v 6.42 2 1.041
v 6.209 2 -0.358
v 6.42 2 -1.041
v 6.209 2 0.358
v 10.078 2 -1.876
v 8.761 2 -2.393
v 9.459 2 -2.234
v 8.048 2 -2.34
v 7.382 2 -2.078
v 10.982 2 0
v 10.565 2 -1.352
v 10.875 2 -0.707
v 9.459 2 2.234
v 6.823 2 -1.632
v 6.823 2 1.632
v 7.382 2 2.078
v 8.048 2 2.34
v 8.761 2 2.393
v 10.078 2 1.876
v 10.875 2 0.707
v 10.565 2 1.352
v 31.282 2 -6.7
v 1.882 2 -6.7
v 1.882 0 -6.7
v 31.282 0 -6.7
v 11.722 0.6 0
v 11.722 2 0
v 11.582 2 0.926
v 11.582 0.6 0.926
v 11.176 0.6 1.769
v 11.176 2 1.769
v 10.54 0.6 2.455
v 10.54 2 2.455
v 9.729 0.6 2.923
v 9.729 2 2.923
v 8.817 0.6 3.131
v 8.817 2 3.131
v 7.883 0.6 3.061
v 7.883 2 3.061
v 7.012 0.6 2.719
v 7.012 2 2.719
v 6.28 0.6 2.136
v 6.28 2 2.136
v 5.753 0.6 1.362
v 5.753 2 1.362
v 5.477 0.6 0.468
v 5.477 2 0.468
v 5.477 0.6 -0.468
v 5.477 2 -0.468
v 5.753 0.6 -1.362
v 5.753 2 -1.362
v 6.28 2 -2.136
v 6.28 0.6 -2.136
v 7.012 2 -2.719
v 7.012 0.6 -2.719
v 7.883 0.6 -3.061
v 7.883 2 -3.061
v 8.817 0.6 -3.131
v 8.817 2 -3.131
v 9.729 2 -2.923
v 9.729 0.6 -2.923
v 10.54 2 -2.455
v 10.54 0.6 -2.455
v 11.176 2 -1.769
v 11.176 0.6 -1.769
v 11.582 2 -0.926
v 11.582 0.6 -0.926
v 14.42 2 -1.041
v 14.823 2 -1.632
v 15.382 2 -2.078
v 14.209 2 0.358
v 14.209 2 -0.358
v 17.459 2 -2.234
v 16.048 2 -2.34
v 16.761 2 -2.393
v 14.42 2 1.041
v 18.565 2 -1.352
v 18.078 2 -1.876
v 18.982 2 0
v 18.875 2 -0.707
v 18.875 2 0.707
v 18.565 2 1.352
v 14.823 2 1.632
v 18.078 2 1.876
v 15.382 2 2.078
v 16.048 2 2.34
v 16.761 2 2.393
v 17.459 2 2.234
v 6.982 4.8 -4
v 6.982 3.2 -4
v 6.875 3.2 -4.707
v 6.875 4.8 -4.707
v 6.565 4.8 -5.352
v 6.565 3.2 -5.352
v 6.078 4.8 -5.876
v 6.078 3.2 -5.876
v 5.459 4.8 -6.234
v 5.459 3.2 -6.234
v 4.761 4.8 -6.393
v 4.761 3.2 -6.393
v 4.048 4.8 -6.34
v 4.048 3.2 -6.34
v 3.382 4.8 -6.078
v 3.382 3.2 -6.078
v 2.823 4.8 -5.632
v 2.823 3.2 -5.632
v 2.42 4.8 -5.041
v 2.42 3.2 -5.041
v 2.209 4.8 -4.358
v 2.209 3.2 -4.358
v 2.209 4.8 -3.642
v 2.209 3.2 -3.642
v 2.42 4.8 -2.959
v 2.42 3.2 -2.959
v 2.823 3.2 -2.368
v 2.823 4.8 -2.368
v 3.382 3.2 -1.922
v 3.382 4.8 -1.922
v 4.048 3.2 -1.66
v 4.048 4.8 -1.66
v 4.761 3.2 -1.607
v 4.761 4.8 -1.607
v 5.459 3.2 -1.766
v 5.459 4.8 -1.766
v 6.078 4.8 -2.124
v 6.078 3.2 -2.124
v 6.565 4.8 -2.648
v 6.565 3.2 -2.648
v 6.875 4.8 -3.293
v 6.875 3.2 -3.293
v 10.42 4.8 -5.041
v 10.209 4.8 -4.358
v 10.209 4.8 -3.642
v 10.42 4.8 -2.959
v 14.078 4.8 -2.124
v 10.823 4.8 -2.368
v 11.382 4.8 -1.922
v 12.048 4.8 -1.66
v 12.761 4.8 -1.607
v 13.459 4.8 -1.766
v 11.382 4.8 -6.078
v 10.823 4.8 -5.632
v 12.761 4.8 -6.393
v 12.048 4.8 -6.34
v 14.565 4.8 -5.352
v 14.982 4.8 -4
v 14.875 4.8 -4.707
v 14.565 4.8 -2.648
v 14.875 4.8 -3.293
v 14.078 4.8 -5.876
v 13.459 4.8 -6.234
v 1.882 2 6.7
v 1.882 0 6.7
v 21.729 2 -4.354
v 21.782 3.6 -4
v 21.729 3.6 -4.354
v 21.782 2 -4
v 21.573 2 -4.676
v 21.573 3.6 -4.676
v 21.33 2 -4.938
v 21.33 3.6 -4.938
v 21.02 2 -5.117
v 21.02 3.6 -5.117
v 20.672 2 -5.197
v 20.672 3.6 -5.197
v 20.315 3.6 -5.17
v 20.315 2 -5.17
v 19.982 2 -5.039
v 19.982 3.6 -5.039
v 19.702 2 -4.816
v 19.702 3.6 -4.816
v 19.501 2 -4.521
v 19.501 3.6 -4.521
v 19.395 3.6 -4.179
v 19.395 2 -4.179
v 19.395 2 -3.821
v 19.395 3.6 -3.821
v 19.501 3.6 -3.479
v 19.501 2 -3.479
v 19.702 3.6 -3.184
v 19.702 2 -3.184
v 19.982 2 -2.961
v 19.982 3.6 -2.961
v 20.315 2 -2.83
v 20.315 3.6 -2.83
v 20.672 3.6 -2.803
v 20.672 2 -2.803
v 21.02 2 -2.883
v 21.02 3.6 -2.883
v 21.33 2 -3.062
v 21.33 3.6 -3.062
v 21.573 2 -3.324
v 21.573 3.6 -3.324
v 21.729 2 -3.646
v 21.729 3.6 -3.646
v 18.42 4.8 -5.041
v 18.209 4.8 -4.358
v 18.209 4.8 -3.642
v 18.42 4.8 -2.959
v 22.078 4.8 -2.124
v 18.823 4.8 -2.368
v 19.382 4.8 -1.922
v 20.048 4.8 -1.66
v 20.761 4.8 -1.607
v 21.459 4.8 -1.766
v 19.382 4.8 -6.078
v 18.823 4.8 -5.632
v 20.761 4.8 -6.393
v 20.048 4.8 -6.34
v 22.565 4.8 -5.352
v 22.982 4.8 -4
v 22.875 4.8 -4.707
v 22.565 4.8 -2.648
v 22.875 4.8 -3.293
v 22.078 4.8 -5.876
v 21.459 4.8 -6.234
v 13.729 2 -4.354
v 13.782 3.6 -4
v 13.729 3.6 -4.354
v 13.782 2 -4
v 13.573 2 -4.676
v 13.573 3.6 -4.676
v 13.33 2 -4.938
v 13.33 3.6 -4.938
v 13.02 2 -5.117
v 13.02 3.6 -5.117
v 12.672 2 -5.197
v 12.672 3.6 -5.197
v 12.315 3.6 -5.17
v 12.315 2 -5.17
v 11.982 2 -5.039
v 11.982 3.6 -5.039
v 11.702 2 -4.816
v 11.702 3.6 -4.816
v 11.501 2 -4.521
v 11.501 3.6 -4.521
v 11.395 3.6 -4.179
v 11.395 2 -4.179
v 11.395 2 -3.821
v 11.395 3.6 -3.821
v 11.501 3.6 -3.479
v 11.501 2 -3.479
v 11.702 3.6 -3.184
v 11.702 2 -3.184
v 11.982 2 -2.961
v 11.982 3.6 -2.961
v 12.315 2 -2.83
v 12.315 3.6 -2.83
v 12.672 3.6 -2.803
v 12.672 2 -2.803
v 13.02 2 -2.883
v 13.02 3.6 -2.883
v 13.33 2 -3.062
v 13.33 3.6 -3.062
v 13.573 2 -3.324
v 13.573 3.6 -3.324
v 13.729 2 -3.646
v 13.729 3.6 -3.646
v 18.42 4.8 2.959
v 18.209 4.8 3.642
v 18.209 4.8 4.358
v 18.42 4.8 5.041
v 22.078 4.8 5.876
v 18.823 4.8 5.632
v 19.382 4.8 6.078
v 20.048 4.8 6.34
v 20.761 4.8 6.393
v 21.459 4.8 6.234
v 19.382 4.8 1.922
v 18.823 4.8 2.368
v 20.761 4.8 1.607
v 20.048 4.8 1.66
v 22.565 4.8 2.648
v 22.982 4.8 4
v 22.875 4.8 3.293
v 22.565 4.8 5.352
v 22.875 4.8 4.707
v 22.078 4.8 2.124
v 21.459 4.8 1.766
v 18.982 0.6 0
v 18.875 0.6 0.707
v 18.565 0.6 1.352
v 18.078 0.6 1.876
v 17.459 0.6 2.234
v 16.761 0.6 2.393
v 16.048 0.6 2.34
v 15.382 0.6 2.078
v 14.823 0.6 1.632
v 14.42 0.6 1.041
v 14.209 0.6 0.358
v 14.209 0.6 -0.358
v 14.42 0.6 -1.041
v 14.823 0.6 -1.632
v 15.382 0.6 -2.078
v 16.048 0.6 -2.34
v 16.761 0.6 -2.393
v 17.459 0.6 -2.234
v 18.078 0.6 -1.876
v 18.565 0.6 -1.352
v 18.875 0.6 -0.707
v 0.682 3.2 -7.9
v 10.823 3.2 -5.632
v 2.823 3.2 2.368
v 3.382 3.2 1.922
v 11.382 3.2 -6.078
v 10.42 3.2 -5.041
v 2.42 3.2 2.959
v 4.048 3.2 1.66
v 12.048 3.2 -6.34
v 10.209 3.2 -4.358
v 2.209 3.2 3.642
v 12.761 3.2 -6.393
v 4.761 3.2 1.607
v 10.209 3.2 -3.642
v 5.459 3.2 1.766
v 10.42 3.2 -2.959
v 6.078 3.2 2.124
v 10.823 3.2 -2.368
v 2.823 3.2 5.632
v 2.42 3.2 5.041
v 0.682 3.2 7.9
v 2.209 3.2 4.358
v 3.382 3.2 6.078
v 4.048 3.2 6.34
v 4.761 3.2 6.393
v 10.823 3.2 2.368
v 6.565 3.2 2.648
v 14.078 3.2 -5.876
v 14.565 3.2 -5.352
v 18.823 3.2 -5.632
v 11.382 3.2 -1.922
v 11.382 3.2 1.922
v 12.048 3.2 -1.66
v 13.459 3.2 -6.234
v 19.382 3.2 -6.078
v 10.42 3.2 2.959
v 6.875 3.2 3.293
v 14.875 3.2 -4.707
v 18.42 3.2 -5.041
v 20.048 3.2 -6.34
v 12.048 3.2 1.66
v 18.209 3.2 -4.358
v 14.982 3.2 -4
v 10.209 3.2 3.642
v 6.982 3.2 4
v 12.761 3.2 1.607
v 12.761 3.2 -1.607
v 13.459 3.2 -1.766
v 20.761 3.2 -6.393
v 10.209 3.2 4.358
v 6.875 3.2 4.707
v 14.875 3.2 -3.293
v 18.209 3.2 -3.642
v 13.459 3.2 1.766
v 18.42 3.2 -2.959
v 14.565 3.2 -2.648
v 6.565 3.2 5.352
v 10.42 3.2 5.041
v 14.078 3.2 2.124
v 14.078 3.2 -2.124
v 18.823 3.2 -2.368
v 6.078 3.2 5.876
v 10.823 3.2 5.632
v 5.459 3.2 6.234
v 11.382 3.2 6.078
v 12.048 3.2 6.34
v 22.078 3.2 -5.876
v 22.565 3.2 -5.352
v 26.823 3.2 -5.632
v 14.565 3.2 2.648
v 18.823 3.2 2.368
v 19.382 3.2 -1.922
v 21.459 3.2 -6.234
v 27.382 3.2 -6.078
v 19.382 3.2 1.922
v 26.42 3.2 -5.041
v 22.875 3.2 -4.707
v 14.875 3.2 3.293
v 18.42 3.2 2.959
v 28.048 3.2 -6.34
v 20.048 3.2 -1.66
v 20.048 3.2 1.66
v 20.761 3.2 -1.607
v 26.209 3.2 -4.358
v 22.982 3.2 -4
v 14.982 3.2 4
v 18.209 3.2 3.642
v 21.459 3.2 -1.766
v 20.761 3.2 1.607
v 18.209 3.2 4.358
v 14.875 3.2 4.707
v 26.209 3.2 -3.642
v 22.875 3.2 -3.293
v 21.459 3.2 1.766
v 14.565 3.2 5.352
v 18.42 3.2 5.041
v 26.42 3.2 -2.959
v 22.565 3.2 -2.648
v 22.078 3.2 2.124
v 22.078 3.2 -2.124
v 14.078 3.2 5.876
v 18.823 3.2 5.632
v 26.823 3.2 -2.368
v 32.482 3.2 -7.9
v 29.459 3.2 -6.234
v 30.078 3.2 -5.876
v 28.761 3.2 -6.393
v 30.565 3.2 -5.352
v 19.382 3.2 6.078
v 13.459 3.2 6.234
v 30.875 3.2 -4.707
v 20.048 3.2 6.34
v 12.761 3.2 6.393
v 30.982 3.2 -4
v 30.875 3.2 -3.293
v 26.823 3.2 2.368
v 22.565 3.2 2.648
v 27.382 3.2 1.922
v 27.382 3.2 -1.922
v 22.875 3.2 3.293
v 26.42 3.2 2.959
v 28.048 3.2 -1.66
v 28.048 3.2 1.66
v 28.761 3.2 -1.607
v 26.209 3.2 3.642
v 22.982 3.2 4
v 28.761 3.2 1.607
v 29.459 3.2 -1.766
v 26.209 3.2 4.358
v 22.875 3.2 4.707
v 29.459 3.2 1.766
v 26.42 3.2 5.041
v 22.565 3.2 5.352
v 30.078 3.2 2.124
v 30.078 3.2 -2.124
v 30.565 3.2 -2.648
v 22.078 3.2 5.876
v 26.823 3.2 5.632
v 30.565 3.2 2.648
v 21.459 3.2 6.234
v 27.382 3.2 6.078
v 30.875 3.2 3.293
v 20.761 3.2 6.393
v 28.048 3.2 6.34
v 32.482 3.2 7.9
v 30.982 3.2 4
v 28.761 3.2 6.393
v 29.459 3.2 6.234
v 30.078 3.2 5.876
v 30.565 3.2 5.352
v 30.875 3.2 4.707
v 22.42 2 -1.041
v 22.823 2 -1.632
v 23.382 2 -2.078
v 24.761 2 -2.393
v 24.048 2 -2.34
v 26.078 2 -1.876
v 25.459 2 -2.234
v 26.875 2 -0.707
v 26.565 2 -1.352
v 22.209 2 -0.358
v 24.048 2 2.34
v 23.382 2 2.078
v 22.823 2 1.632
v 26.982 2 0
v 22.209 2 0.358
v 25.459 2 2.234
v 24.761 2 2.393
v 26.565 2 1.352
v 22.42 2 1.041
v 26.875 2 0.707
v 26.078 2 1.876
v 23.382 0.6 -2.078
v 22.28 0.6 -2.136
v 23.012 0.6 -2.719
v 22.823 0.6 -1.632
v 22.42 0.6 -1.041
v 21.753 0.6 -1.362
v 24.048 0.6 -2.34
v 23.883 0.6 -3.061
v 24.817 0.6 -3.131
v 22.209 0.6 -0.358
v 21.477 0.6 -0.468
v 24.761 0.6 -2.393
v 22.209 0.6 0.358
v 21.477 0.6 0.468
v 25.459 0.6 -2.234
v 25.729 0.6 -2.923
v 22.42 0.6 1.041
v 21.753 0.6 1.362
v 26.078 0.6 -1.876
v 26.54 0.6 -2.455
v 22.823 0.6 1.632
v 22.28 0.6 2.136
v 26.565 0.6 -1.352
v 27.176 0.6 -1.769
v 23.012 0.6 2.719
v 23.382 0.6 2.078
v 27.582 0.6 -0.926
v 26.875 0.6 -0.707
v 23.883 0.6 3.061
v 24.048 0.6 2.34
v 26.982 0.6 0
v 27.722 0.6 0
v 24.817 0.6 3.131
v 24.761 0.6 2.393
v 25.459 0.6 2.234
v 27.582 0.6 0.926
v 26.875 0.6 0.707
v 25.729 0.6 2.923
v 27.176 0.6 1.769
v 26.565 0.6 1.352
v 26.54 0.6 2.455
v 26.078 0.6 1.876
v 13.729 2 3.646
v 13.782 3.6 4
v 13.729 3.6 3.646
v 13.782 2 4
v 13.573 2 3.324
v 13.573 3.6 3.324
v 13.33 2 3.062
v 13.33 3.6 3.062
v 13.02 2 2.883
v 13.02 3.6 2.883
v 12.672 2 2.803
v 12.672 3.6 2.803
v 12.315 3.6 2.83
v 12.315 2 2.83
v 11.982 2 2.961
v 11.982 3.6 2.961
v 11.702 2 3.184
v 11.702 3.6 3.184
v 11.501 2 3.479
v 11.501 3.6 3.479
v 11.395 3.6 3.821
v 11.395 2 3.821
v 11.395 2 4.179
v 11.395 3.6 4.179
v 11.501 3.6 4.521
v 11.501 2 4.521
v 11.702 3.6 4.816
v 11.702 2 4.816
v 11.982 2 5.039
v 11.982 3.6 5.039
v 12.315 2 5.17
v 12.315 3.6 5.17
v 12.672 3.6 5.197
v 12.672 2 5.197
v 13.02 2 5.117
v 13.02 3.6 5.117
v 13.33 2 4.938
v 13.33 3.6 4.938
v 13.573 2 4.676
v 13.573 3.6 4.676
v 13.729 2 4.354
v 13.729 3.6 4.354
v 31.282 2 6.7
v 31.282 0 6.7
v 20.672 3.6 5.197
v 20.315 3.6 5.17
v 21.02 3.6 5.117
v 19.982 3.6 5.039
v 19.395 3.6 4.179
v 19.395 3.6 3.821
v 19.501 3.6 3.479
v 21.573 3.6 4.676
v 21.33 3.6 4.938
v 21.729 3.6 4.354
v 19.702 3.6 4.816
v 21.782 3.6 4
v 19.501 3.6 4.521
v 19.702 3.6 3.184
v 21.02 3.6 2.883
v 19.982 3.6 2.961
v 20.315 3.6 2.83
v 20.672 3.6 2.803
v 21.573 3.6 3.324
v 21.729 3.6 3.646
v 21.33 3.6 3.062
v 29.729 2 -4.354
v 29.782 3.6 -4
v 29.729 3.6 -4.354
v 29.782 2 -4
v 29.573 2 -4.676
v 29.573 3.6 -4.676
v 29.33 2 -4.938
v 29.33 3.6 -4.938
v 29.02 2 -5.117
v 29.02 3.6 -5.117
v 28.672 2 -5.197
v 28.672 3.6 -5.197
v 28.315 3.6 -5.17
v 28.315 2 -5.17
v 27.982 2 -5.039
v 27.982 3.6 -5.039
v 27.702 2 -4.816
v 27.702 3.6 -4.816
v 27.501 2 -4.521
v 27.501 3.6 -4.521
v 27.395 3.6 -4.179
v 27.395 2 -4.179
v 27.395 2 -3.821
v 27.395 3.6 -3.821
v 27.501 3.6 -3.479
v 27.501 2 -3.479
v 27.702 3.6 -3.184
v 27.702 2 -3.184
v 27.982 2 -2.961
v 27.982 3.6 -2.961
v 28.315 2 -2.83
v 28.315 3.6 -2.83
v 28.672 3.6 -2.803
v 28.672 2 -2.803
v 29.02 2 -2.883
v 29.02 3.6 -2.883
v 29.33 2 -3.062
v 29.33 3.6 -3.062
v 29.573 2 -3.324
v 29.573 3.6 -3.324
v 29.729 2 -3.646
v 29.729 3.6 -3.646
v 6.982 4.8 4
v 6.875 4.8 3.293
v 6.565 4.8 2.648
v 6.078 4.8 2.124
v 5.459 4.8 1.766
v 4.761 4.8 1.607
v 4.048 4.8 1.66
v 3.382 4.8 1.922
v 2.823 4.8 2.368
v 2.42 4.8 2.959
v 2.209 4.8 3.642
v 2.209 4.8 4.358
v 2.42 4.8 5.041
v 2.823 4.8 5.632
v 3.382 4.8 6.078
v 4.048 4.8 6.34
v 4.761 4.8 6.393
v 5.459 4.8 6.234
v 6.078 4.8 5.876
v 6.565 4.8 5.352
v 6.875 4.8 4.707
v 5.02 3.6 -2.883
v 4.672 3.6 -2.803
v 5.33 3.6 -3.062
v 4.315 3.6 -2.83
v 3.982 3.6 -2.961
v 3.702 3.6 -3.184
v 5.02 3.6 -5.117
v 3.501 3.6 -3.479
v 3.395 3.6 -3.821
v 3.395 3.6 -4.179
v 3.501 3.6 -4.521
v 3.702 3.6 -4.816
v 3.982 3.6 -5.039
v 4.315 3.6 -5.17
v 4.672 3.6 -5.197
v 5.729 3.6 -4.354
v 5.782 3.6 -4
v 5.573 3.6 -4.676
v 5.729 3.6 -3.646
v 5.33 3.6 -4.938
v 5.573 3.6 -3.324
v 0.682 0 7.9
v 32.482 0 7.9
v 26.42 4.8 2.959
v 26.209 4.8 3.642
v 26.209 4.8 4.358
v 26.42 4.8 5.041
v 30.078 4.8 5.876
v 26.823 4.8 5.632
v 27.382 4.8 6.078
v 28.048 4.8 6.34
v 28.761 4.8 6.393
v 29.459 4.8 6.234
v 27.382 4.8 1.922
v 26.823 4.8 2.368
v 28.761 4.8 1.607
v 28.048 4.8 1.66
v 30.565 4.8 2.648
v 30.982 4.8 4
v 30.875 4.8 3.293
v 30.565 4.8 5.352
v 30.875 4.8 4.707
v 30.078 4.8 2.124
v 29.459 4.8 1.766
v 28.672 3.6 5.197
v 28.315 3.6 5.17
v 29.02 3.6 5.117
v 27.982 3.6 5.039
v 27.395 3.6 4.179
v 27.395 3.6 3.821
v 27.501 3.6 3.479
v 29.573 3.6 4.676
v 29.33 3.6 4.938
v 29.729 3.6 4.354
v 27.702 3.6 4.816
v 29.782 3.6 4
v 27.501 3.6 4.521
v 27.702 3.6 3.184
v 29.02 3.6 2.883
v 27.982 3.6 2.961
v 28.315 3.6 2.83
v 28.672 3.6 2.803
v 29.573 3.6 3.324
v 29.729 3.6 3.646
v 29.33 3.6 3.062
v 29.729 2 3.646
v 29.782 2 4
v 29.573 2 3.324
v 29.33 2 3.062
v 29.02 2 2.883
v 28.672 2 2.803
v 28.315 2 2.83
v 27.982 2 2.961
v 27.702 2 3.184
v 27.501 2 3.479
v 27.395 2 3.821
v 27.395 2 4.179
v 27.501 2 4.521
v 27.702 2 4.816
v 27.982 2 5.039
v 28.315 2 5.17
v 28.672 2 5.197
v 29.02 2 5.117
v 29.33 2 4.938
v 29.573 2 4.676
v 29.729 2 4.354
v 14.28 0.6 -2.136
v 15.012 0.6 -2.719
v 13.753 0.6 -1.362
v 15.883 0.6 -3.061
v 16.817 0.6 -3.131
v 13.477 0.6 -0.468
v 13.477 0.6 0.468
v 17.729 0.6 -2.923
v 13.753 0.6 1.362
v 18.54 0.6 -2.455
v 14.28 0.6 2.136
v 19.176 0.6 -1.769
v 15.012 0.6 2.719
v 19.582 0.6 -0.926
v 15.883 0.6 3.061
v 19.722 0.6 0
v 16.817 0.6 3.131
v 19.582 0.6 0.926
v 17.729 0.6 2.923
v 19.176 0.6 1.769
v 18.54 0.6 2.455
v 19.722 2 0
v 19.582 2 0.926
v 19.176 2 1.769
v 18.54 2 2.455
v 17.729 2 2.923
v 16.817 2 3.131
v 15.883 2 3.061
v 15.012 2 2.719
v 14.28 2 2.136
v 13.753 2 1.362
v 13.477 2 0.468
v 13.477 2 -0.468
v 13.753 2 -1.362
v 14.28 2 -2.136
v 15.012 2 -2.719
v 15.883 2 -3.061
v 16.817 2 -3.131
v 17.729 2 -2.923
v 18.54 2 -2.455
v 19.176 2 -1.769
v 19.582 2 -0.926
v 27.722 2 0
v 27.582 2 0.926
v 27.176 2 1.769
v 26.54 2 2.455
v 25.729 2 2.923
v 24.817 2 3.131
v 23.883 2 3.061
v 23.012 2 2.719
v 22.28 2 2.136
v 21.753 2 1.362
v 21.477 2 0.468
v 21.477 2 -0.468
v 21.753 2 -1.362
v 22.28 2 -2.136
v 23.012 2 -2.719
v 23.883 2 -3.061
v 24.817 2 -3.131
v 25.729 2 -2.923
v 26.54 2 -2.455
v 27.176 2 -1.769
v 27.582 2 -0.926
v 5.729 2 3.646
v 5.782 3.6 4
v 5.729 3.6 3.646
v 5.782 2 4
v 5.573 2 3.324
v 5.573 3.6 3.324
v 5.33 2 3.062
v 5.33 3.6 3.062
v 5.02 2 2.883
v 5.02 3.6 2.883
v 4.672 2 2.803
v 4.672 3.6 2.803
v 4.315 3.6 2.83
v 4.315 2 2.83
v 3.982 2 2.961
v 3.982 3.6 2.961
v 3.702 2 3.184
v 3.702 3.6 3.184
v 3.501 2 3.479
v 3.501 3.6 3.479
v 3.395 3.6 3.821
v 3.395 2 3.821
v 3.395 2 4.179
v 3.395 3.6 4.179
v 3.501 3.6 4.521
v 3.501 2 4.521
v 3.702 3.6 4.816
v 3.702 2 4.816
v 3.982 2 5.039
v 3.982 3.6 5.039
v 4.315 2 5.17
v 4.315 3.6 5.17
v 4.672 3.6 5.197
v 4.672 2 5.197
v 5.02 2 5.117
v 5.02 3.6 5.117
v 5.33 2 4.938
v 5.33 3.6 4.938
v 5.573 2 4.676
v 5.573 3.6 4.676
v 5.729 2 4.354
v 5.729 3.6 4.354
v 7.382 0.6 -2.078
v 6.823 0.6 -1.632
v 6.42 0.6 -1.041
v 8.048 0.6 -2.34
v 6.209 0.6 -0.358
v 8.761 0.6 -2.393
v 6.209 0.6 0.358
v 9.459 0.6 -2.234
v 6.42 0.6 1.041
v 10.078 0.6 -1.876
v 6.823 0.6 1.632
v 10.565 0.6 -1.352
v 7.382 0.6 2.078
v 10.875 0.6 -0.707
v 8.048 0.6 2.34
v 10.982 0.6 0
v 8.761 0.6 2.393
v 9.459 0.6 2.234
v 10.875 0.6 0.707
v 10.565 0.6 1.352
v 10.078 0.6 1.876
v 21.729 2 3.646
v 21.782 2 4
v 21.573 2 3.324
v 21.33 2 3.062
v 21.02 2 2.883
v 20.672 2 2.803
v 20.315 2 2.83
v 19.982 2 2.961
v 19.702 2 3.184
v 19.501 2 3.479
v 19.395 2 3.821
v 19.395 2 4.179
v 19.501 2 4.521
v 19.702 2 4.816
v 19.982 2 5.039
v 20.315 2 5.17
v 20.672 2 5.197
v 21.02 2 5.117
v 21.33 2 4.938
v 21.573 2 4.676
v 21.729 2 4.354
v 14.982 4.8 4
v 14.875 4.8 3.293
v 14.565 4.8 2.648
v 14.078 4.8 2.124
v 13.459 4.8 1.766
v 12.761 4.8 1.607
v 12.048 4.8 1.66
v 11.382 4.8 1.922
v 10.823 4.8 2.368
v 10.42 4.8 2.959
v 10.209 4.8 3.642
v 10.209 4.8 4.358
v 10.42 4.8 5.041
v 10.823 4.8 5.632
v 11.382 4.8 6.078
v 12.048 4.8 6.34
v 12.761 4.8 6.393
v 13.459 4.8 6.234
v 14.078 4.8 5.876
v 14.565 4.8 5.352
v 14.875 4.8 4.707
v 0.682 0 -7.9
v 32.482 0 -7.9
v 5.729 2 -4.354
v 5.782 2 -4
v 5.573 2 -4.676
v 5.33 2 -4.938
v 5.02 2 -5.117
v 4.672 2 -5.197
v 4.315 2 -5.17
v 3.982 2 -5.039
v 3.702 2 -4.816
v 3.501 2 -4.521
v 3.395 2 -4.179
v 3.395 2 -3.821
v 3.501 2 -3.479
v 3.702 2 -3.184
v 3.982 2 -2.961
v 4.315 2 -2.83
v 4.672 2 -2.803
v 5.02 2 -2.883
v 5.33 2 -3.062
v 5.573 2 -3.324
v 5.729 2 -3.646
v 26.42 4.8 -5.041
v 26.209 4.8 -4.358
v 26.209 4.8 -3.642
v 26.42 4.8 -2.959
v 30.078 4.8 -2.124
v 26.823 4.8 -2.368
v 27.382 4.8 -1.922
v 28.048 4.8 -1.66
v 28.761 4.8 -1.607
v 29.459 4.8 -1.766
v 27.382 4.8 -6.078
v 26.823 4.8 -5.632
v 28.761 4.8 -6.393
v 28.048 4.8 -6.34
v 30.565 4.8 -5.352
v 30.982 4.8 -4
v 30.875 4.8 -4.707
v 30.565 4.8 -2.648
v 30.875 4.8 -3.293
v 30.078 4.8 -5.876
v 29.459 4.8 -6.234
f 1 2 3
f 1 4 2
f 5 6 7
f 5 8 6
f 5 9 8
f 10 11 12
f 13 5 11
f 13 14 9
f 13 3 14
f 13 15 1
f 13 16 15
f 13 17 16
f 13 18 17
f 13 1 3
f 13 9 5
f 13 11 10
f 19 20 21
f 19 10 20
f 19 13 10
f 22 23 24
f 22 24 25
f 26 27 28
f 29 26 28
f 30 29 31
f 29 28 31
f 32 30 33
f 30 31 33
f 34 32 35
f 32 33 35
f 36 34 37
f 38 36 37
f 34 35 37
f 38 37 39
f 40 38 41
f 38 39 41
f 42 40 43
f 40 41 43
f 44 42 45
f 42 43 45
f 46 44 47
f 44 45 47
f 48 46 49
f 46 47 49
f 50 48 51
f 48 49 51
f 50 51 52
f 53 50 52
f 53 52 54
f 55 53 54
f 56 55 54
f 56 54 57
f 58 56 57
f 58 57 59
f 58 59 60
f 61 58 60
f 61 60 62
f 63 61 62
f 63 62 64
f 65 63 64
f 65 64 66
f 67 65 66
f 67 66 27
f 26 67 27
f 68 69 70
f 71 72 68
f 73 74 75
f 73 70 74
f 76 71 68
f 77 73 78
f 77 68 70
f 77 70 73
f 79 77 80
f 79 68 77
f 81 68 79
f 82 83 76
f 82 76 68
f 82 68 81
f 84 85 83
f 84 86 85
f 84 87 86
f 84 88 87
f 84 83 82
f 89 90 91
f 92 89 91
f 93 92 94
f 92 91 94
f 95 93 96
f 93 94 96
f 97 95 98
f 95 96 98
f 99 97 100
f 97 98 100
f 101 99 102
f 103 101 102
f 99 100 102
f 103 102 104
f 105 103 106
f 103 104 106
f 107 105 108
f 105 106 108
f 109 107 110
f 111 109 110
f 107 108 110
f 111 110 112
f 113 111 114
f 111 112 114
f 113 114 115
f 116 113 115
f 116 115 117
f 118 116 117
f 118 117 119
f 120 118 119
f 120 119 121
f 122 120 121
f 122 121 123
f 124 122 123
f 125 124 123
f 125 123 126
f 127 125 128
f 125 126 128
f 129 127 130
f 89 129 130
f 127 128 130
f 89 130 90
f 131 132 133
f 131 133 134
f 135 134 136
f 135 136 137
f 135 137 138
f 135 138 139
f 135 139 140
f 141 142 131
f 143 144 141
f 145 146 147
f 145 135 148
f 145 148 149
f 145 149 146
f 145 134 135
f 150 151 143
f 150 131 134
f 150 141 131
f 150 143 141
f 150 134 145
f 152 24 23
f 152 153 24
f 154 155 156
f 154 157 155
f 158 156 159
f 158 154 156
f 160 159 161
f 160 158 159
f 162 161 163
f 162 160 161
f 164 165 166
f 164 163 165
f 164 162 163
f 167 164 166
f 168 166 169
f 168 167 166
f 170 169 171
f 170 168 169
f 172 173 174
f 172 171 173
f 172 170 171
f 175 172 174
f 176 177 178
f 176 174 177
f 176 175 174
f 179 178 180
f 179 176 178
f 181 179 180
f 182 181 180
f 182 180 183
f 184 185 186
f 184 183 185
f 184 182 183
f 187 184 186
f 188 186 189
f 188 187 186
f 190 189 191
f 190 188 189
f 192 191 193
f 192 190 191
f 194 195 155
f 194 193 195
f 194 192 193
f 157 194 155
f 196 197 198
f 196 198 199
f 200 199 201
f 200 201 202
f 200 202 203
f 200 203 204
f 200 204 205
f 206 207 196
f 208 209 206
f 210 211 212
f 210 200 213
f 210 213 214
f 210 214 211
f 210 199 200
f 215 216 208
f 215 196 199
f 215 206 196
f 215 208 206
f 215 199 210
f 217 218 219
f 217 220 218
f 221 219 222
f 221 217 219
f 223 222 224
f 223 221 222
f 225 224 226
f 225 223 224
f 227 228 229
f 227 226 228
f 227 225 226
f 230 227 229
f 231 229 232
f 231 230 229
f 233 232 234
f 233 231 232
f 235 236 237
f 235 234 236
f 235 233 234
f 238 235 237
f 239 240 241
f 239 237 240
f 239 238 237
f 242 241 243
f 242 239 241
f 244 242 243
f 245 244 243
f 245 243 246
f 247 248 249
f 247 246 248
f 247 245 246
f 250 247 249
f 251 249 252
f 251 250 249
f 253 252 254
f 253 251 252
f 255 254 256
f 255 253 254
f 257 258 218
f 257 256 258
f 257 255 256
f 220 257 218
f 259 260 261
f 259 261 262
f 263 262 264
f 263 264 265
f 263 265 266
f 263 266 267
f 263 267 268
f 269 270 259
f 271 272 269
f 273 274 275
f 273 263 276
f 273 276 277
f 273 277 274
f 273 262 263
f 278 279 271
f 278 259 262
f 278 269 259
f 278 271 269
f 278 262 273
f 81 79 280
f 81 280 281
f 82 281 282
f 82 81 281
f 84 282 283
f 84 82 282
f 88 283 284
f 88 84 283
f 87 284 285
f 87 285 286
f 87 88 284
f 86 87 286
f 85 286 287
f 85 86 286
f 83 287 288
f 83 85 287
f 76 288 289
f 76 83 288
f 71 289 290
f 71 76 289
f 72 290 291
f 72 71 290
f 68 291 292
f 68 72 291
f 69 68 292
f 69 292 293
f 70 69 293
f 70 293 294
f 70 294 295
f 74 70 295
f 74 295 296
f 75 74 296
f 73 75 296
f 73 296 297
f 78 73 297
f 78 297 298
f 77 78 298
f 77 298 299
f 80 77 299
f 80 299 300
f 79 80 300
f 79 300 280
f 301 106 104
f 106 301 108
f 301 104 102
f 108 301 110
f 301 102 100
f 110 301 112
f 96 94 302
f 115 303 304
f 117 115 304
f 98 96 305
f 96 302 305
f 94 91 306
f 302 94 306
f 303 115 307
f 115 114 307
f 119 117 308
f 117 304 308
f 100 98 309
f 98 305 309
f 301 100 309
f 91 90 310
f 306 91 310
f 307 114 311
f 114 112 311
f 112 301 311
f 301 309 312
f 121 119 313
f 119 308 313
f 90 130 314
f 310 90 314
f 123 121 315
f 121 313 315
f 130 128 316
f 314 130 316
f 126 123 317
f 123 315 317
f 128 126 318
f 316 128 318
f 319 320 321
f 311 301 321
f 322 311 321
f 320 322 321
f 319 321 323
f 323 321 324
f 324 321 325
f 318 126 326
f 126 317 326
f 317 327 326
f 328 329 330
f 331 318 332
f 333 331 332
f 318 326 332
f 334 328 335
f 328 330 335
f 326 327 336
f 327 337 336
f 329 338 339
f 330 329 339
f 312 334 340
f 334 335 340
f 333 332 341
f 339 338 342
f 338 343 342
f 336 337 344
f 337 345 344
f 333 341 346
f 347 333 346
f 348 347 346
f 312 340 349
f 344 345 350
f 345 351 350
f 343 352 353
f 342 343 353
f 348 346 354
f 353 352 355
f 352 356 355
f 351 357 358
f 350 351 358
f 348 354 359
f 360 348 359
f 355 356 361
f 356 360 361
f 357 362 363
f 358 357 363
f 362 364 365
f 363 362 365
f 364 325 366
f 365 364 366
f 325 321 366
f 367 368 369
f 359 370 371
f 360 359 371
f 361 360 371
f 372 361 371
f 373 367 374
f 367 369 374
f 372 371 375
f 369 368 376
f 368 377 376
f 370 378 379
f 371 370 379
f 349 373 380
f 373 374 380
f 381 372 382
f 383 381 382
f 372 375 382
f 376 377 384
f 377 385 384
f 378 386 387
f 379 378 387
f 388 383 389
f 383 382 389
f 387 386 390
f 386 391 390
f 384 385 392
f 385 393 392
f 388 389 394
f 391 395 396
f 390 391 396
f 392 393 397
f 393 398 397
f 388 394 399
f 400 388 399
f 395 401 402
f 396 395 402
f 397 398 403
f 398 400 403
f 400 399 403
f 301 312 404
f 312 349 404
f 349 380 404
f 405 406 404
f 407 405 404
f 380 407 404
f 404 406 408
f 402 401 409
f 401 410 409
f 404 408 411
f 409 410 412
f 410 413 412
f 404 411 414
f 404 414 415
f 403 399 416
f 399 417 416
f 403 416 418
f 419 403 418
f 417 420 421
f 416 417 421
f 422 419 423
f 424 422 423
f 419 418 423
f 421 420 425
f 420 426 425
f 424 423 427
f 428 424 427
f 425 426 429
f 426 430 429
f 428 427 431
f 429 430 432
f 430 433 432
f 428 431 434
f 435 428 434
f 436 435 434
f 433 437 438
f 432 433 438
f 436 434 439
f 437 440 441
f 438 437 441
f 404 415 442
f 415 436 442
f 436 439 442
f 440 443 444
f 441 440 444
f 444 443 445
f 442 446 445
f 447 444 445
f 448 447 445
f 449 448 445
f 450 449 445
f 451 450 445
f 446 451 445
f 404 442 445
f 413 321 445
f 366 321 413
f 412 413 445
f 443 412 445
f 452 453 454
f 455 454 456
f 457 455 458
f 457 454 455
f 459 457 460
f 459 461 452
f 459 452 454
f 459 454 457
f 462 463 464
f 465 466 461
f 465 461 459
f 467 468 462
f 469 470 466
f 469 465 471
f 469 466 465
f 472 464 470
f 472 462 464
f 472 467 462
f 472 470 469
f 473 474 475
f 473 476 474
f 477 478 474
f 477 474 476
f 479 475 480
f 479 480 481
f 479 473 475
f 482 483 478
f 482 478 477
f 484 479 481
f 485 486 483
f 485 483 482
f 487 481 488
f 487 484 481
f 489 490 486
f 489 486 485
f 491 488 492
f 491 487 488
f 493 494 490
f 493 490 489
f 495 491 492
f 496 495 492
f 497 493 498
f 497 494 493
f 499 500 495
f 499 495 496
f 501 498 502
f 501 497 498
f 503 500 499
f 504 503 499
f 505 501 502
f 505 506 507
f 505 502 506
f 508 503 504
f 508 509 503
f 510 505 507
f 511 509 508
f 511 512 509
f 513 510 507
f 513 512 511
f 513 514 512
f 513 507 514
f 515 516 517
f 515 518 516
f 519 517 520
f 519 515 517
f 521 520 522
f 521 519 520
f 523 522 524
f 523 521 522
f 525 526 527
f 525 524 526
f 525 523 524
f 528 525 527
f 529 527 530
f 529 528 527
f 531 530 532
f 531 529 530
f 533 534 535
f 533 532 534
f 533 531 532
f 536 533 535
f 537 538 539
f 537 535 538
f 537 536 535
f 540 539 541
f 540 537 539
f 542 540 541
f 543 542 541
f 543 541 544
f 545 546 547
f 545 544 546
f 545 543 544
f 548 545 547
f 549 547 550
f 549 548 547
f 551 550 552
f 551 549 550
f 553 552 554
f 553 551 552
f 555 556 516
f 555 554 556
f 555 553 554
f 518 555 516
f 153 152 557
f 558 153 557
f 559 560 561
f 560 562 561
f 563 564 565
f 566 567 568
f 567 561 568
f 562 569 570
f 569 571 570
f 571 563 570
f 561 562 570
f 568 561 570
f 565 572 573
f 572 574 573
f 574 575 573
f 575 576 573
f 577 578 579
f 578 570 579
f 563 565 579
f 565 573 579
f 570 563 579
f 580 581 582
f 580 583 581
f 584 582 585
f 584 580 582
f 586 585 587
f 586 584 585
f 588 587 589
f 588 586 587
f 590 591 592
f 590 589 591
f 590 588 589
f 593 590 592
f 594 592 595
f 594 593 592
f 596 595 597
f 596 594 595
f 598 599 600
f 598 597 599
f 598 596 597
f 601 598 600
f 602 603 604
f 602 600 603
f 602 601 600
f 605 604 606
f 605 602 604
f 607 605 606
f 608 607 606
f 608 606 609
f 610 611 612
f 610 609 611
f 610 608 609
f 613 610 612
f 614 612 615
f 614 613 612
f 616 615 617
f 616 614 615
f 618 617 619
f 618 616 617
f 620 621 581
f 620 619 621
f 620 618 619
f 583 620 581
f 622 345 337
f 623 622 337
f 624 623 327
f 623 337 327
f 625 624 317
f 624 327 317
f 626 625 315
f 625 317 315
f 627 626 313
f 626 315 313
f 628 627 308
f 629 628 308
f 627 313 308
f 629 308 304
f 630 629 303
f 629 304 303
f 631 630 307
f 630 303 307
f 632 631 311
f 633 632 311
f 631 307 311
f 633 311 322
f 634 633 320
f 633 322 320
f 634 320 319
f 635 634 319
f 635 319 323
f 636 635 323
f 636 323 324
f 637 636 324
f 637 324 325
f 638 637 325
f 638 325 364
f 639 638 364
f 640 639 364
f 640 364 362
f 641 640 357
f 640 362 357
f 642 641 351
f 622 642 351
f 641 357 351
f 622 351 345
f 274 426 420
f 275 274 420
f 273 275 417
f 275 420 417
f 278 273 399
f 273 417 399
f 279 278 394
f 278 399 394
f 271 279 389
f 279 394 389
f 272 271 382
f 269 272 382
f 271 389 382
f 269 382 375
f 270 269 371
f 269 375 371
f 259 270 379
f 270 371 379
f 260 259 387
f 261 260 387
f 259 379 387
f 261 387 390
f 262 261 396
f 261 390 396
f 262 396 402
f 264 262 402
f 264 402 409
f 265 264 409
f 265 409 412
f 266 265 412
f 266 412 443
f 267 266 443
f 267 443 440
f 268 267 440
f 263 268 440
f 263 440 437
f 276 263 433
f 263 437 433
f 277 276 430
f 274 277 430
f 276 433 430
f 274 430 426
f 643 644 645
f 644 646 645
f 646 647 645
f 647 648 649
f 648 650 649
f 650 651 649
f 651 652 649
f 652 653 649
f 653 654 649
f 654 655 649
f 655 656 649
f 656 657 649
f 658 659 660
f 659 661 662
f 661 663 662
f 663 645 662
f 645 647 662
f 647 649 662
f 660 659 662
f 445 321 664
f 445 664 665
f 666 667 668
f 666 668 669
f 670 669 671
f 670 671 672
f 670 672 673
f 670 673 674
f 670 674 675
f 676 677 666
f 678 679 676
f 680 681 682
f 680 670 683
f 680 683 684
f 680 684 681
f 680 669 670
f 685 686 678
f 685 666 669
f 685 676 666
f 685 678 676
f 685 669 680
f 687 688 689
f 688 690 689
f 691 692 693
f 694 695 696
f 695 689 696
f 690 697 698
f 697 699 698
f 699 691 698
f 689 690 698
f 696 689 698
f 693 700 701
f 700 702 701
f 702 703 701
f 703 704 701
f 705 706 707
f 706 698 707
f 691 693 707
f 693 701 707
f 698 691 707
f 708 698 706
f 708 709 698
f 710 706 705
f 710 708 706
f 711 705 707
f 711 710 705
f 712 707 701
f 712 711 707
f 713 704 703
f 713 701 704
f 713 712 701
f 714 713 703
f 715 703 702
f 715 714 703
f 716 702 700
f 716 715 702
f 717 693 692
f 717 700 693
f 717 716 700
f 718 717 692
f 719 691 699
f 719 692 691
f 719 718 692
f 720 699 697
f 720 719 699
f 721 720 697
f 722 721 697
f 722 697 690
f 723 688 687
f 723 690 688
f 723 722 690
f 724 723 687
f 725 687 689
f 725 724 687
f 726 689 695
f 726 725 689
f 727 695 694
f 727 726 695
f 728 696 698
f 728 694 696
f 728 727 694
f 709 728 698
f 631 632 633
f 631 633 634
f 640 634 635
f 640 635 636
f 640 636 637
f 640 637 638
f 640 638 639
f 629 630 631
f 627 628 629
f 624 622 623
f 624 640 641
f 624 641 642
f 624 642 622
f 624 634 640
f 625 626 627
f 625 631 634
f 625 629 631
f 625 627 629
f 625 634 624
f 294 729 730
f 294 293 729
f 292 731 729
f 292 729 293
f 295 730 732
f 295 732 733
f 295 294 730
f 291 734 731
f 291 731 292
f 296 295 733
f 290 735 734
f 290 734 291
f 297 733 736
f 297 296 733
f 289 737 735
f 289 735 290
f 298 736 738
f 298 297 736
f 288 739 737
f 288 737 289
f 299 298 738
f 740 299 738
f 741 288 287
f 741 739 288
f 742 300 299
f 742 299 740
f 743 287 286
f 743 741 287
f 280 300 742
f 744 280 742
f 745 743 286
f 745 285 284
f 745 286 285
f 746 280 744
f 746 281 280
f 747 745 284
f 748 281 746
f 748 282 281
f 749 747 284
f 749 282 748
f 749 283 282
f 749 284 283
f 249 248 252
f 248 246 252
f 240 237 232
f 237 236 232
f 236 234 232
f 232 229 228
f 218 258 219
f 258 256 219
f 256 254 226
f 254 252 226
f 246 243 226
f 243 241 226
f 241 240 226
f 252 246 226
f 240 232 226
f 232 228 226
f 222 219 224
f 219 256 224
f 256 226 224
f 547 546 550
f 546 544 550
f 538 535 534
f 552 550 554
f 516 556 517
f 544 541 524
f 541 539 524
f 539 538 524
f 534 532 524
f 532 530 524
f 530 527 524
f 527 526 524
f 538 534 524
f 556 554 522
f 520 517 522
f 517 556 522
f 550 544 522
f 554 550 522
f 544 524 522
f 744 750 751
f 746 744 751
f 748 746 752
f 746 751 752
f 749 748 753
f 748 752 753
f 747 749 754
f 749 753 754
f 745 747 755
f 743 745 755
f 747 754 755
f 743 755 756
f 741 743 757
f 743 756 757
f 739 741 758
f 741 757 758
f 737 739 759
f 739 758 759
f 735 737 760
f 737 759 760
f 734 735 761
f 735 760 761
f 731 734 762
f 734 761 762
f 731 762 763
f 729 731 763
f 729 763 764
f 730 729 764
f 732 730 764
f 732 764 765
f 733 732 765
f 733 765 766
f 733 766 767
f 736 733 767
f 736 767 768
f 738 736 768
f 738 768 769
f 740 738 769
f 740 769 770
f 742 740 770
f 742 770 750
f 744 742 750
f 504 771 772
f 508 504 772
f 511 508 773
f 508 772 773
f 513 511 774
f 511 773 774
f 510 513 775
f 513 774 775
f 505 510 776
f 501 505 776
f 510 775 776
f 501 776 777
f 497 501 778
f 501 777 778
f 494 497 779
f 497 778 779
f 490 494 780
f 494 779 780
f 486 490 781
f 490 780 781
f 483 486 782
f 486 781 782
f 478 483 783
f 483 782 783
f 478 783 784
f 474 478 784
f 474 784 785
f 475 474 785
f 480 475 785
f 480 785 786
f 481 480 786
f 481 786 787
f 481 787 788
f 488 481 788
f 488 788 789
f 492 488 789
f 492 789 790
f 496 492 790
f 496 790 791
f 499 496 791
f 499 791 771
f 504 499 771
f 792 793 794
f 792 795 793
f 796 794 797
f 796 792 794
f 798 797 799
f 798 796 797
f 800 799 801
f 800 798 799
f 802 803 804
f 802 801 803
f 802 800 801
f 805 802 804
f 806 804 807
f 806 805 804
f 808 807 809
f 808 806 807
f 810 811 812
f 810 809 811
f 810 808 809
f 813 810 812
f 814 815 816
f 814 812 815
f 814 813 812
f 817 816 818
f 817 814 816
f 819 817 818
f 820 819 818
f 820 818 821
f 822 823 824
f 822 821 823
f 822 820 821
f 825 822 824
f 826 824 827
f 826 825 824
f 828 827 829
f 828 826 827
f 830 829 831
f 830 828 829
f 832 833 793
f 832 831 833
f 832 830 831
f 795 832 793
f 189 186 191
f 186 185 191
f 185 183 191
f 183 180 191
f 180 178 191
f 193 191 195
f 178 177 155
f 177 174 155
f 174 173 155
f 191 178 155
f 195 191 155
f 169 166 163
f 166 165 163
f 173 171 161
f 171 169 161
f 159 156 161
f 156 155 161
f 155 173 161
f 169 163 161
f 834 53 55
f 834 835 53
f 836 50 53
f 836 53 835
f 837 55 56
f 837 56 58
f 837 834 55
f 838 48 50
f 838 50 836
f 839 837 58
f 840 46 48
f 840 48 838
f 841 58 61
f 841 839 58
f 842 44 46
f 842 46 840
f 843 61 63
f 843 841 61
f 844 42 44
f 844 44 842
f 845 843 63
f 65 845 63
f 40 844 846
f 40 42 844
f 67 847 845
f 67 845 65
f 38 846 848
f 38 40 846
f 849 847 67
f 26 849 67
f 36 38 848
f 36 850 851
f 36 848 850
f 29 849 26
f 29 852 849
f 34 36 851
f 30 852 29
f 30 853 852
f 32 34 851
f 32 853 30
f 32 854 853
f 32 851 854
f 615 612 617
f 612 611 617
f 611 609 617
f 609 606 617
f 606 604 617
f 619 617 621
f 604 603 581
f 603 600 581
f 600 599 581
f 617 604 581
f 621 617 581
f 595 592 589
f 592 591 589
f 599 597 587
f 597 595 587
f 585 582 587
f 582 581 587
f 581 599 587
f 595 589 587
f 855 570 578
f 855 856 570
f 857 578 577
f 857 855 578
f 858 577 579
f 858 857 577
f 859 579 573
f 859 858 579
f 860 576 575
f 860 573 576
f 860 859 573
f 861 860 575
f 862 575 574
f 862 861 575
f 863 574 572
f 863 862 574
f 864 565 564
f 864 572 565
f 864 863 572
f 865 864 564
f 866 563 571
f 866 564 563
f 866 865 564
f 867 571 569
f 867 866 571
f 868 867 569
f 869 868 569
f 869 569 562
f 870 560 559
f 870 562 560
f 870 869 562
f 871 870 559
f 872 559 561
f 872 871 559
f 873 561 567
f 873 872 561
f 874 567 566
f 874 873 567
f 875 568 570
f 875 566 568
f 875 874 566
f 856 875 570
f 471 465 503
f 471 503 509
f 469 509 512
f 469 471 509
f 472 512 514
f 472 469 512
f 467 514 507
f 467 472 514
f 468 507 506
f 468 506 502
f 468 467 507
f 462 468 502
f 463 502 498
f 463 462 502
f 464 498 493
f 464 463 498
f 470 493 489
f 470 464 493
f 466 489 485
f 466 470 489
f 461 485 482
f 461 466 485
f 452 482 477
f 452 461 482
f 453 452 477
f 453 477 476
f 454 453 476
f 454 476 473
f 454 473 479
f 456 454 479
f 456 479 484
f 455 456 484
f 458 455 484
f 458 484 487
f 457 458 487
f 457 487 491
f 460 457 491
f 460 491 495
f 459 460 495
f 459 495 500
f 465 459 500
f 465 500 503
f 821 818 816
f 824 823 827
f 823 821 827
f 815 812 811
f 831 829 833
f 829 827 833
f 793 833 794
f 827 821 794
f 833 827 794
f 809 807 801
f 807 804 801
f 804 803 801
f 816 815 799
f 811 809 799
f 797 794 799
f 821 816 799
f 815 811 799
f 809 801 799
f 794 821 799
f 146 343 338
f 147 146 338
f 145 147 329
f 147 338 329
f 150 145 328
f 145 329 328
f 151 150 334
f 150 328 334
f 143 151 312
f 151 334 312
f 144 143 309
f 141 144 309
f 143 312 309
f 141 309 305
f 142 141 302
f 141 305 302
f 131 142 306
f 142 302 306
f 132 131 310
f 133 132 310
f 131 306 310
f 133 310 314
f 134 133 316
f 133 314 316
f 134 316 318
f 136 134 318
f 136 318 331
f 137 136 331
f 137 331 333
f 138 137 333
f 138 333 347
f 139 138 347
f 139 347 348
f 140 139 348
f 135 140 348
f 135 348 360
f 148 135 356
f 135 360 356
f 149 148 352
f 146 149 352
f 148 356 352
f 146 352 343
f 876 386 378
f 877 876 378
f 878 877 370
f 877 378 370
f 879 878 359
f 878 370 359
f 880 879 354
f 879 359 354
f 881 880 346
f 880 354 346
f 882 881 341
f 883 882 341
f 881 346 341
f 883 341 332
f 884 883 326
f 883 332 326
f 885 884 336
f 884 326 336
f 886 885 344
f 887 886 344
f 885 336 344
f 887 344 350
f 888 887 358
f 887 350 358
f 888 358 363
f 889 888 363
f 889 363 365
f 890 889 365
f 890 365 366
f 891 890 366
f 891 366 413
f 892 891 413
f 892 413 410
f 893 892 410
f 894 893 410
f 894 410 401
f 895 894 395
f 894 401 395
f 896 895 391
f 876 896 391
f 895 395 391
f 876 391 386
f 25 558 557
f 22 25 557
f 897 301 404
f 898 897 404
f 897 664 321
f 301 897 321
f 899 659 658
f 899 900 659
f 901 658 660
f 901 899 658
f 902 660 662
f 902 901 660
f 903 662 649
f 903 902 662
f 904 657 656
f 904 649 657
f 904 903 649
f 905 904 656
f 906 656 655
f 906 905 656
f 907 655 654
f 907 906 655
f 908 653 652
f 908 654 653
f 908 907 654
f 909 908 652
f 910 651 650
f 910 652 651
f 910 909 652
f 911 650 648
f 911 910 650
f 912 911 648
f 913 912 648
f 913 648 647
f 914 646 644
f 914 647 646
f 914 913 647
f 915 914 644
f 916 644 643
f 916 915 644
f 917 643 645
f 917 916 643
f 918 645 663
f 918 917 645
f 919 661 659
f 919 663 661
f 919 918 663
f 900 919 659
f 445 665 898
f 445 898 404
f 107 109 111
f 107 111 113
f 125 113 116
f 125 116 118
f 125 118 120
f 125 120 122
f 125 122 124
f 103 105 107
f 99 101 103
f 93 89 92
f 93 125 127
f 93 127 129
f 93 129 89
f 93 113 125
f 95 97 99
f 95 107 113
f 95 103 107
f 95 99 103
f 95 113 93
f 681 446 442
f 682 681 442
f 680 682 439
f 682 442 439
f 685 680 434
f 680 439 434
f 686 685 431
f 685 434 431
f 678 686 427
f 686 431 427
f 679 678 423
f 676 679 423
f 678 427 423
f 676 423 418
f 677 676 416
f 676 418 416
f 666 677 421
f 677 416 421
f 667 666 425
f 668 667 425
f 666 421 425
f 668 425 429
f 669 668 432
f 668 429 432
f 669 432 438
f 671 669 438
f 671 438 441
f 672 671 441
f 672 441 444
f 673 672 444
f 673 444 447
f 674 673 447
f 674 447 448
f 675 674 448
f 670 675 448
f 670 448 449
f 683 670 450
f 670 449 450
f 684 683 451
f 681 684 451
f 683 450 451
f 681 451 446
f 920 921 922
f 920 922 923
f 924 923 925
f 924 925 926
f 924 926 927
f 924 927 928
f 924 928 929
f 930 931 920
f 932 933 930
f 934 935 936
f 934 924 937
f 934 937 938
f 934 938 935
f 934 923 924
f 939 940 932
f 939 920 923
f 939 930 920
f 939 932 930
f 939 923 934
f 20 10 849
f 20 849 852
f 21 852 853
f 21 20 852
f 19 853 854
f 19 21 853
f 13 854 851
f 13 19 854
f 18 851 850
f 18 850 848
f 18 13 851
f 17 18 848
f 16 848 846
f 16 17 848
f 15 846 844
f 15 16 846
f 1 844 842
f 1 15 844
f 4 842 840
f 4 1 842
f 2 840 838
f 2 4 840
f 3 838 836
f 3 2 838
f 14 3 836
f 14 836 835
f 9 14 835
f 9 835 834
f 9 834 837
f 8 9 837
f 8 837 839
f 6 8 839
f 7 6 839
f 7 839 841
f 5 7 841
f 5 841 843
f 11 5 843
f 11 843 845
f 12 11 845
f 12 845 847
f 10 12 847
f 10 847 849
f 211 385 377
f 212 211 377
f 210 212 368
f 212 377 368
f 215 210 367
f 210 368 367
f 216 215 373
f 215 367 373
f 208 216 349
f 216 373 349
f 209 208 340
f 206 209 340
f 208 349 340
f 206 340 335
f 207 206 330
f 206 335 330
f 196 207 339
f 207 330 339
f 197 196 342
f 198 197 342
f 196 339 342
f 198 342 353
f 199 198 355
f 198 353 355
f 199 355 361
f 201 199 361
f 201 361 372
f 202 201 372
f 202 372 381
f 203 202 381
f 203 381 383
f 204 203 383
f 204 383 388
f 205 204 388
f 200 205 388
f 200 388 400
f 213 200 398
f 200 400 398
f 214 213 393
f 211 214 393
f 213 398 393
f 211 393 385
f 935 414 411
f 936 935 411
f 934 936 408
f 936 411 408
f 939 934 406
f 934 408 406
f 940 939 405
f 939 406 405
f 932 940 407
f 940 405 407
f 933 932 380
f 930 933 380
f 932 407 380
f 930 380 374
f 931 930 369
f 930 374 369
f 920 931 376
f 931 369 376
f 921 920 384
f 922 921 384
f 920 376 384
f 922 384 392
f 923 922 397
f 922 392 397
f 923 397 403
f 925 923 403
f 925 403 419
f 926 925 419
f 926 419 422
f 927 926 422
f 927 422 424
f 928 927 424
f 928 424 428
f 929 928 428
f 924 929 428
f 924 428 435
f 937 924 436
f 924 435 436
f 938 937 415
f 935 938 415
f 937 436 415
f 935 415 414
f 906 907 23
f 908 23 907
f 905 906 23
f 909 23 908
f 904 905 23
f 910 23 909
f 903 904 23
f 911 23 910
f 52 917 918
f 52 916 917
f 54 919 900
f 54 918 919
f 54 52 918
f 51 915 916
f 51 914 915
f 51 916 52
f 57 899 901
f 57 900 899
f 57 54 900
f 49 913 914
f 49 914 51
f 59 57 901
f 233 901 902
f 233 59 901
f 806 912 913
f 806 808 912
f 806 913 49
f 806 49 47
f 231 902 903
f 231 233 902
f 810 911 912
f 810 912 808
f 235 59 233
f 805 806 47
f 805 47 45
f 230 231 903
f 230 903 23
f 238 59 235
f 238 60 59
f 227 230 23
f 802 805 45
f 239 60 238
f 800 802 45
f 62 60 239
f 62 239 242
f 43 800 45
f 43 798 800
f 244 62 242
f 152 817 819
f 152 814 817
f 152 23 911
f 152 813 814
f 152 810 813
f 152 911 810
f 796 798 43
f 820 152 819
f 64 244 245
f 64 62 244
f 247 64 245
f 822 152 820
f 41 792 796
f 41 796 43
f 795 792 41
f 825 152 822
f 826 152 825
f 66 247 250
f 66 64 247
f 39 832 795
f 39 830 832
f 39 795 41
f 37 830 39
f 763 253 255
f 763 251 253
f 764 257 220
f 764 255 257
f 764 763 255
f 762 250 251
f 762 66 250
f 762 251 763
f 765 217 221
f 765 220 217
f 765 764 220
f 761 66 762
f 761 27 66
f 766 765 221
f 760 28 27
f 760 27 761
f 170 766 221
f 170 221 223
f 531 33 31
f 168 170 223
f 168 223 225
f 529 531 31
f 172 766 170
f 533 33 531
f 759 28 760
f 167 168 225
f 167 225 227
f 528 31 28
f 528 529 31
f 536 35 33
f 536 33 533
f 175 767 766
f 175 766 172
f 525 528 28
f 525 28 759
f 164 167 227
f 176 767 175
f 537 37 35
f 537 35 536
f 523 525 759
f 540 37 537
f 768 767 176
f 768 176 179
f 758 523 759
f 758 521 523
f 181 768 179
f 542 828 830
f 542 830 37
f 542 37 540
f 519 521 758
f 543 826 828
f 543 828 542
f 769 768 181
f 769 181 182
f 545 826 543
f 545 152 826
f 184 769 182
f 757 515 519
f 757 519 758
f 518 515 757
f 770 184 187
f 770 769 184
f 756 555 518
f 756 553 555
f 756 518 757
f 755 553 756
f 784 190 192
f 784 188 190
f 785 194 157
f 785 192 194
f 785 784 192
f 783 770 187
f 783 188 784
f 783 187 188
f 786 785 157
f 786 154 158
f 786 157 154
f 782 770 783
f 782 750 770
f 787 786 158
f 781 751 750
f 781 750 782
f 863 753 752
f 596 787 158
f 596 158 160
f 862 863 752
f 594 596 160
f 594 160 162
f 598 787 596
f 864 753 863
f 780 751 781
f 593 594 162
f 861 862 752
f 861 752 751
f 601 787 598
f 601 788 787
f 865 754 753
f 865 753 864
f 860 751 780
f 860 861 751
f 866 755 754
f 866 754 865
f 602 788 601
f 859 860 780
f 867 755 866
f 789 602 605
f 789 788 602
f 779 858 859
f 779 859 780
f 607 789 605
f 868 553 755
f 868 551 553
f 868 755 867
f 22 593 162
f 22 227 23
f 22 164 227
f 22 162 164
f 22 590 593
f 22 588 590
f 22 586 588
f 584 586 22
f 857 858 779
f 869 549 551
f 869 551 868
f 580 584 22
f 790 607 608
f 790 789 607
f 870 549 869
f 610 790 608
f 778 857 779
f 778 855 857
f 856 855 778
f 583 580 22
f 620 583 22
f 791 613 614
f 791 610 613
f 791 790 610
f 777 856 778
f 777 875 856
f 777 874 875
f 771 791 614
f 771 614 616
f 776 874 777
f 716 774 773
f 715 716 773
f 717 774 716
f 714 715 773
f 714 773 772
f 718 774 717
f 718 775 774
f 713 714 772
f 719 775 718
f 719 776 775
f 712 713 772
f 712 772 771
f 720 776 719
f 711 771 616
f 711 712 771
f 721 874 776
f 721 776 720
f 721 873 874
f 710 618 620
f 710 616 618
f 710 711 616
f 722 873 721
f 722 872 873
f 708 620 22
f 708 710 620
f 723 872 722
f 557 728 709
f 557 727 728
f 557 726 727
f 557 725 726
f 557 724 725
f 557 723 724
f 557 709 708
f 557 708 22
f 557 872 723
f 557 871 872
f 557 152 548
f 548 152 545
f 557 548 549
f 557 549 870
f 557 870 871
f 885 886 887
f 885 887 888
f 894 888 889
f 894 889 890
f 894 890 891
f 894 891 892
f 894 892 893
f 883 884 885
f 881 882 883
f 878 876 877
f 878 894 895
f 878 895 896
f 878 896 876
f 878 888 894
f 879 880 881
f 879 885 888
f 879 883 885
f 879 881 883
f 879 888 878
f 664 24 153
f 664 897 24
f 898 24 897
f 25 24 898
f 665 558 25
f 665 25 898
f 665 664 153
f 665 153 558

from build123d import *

# Parameters (mm, degrees)
MAINBASESKETCH_W             = 31.8
MAINBASESKETCH_H             = 3.2
MAINBASEEXTRUDE_DEPTH        = 7.9
STUDSSKETCH_R                = 2.4
STUDSEXTRUDE_DEPTH           = 1.6
STUDSPATTERN_COUNT           = 2
STUDSPATTERN_PITCH           = 8
STUDSPATTERN_COUNT_DIR2      = 4
STUDSPATTERN_PITCH_DIR2      = 8
MAINBASESHELL_T              = -1.2
UNDERSIDECIRCLEEXT_START     = -0.2
UNDERSIDECIRCLESKETCH_R      = 3.14
UNDERSIDECIRCLESKETCH_R_2    = 2.4
UNDERSIDECIRCLEEXT_DEPTH     = 1.6
UNDERSIDECIRCLEPATTERN_COUNT = 3
UNDERSIDECIRCLEPATTERN_PITCH = 8


with BuildPart() as part:
    # MainBaseSketch → MainBaseExtrude (new, symmetric)
    with BuildSketch(Plane.XY):
        with Locations((16.581967213, 1.6)):
            Rectangle(MAINBASESKETCH_W, MAINBASESKETCH_H)
    extrude(amount=MAINBASEEXTRUDE_DEPTH, both=True)

    # StudsSketch → StudsExtrude (add)
    with BuildSketch(Plane(origin=(0, 3.2, 0), x_dir=(1, 0, 0), z_dir=(0, 1, 0))):
        with Locations((4.581967213, 4)):
            Circle(STUDSSKETCH_R)
    studsextrude = extrude(amount=STUDSEXTRUDE_DEPTH)

    # StudsPattern: StudsExtrude 2 × 4
    with Locations(*[(j * STUDSPATTERN_PITCH_DIR2, 0, i * STUDSPATTERN_PITCH) for i in range(STUDSPATTERN_COUNT) for j in range(STUDSPATTERN_COUNT_DIR2) if (i, j) != (0, 0)]):
        add(studsextrude)

    # MainBaseShell
    mainbaseshell_openings = [part.faces().sort_by_distance(p)[0] for p in [
        (16.581967213, 0, 0),
    ]]
    offset(amount=MAINBASESHELL_T, openings=mainbaseshell_openings, kind=Kind.INTERSECTION)

    # UnderSideCircleSketch → UnderSideCircleExt (add)
    with BuildSketch(Plane.XZ.offset(-2).offset(UNDERSIDECIRCLEEXT_START)):
        with Locations((8.581967213, 0)):
            Circle(UNDERSIDECIRCLESKETCH_R)
        with Locations((8.581967213, 0)):
            Circle(UNDERSIDECIRCLESKETCH_R_2, mode=Mode.SUBTRACT)
    undersidecircleext = extrude(amount=UNDERSIDECIRCLEEXT_DEPTH)

    # UnderSideCirclePattern: UnderSideCircleExt ×3
    with Locations(*[(i * UNDERSIDECIRCLEPATTERN_PITCH, 0, 0) for i in range(1, UNDERSIDECIRCLEPATTERN_COUNT)]):
        add(undersidecircleext)


solid = part.part
